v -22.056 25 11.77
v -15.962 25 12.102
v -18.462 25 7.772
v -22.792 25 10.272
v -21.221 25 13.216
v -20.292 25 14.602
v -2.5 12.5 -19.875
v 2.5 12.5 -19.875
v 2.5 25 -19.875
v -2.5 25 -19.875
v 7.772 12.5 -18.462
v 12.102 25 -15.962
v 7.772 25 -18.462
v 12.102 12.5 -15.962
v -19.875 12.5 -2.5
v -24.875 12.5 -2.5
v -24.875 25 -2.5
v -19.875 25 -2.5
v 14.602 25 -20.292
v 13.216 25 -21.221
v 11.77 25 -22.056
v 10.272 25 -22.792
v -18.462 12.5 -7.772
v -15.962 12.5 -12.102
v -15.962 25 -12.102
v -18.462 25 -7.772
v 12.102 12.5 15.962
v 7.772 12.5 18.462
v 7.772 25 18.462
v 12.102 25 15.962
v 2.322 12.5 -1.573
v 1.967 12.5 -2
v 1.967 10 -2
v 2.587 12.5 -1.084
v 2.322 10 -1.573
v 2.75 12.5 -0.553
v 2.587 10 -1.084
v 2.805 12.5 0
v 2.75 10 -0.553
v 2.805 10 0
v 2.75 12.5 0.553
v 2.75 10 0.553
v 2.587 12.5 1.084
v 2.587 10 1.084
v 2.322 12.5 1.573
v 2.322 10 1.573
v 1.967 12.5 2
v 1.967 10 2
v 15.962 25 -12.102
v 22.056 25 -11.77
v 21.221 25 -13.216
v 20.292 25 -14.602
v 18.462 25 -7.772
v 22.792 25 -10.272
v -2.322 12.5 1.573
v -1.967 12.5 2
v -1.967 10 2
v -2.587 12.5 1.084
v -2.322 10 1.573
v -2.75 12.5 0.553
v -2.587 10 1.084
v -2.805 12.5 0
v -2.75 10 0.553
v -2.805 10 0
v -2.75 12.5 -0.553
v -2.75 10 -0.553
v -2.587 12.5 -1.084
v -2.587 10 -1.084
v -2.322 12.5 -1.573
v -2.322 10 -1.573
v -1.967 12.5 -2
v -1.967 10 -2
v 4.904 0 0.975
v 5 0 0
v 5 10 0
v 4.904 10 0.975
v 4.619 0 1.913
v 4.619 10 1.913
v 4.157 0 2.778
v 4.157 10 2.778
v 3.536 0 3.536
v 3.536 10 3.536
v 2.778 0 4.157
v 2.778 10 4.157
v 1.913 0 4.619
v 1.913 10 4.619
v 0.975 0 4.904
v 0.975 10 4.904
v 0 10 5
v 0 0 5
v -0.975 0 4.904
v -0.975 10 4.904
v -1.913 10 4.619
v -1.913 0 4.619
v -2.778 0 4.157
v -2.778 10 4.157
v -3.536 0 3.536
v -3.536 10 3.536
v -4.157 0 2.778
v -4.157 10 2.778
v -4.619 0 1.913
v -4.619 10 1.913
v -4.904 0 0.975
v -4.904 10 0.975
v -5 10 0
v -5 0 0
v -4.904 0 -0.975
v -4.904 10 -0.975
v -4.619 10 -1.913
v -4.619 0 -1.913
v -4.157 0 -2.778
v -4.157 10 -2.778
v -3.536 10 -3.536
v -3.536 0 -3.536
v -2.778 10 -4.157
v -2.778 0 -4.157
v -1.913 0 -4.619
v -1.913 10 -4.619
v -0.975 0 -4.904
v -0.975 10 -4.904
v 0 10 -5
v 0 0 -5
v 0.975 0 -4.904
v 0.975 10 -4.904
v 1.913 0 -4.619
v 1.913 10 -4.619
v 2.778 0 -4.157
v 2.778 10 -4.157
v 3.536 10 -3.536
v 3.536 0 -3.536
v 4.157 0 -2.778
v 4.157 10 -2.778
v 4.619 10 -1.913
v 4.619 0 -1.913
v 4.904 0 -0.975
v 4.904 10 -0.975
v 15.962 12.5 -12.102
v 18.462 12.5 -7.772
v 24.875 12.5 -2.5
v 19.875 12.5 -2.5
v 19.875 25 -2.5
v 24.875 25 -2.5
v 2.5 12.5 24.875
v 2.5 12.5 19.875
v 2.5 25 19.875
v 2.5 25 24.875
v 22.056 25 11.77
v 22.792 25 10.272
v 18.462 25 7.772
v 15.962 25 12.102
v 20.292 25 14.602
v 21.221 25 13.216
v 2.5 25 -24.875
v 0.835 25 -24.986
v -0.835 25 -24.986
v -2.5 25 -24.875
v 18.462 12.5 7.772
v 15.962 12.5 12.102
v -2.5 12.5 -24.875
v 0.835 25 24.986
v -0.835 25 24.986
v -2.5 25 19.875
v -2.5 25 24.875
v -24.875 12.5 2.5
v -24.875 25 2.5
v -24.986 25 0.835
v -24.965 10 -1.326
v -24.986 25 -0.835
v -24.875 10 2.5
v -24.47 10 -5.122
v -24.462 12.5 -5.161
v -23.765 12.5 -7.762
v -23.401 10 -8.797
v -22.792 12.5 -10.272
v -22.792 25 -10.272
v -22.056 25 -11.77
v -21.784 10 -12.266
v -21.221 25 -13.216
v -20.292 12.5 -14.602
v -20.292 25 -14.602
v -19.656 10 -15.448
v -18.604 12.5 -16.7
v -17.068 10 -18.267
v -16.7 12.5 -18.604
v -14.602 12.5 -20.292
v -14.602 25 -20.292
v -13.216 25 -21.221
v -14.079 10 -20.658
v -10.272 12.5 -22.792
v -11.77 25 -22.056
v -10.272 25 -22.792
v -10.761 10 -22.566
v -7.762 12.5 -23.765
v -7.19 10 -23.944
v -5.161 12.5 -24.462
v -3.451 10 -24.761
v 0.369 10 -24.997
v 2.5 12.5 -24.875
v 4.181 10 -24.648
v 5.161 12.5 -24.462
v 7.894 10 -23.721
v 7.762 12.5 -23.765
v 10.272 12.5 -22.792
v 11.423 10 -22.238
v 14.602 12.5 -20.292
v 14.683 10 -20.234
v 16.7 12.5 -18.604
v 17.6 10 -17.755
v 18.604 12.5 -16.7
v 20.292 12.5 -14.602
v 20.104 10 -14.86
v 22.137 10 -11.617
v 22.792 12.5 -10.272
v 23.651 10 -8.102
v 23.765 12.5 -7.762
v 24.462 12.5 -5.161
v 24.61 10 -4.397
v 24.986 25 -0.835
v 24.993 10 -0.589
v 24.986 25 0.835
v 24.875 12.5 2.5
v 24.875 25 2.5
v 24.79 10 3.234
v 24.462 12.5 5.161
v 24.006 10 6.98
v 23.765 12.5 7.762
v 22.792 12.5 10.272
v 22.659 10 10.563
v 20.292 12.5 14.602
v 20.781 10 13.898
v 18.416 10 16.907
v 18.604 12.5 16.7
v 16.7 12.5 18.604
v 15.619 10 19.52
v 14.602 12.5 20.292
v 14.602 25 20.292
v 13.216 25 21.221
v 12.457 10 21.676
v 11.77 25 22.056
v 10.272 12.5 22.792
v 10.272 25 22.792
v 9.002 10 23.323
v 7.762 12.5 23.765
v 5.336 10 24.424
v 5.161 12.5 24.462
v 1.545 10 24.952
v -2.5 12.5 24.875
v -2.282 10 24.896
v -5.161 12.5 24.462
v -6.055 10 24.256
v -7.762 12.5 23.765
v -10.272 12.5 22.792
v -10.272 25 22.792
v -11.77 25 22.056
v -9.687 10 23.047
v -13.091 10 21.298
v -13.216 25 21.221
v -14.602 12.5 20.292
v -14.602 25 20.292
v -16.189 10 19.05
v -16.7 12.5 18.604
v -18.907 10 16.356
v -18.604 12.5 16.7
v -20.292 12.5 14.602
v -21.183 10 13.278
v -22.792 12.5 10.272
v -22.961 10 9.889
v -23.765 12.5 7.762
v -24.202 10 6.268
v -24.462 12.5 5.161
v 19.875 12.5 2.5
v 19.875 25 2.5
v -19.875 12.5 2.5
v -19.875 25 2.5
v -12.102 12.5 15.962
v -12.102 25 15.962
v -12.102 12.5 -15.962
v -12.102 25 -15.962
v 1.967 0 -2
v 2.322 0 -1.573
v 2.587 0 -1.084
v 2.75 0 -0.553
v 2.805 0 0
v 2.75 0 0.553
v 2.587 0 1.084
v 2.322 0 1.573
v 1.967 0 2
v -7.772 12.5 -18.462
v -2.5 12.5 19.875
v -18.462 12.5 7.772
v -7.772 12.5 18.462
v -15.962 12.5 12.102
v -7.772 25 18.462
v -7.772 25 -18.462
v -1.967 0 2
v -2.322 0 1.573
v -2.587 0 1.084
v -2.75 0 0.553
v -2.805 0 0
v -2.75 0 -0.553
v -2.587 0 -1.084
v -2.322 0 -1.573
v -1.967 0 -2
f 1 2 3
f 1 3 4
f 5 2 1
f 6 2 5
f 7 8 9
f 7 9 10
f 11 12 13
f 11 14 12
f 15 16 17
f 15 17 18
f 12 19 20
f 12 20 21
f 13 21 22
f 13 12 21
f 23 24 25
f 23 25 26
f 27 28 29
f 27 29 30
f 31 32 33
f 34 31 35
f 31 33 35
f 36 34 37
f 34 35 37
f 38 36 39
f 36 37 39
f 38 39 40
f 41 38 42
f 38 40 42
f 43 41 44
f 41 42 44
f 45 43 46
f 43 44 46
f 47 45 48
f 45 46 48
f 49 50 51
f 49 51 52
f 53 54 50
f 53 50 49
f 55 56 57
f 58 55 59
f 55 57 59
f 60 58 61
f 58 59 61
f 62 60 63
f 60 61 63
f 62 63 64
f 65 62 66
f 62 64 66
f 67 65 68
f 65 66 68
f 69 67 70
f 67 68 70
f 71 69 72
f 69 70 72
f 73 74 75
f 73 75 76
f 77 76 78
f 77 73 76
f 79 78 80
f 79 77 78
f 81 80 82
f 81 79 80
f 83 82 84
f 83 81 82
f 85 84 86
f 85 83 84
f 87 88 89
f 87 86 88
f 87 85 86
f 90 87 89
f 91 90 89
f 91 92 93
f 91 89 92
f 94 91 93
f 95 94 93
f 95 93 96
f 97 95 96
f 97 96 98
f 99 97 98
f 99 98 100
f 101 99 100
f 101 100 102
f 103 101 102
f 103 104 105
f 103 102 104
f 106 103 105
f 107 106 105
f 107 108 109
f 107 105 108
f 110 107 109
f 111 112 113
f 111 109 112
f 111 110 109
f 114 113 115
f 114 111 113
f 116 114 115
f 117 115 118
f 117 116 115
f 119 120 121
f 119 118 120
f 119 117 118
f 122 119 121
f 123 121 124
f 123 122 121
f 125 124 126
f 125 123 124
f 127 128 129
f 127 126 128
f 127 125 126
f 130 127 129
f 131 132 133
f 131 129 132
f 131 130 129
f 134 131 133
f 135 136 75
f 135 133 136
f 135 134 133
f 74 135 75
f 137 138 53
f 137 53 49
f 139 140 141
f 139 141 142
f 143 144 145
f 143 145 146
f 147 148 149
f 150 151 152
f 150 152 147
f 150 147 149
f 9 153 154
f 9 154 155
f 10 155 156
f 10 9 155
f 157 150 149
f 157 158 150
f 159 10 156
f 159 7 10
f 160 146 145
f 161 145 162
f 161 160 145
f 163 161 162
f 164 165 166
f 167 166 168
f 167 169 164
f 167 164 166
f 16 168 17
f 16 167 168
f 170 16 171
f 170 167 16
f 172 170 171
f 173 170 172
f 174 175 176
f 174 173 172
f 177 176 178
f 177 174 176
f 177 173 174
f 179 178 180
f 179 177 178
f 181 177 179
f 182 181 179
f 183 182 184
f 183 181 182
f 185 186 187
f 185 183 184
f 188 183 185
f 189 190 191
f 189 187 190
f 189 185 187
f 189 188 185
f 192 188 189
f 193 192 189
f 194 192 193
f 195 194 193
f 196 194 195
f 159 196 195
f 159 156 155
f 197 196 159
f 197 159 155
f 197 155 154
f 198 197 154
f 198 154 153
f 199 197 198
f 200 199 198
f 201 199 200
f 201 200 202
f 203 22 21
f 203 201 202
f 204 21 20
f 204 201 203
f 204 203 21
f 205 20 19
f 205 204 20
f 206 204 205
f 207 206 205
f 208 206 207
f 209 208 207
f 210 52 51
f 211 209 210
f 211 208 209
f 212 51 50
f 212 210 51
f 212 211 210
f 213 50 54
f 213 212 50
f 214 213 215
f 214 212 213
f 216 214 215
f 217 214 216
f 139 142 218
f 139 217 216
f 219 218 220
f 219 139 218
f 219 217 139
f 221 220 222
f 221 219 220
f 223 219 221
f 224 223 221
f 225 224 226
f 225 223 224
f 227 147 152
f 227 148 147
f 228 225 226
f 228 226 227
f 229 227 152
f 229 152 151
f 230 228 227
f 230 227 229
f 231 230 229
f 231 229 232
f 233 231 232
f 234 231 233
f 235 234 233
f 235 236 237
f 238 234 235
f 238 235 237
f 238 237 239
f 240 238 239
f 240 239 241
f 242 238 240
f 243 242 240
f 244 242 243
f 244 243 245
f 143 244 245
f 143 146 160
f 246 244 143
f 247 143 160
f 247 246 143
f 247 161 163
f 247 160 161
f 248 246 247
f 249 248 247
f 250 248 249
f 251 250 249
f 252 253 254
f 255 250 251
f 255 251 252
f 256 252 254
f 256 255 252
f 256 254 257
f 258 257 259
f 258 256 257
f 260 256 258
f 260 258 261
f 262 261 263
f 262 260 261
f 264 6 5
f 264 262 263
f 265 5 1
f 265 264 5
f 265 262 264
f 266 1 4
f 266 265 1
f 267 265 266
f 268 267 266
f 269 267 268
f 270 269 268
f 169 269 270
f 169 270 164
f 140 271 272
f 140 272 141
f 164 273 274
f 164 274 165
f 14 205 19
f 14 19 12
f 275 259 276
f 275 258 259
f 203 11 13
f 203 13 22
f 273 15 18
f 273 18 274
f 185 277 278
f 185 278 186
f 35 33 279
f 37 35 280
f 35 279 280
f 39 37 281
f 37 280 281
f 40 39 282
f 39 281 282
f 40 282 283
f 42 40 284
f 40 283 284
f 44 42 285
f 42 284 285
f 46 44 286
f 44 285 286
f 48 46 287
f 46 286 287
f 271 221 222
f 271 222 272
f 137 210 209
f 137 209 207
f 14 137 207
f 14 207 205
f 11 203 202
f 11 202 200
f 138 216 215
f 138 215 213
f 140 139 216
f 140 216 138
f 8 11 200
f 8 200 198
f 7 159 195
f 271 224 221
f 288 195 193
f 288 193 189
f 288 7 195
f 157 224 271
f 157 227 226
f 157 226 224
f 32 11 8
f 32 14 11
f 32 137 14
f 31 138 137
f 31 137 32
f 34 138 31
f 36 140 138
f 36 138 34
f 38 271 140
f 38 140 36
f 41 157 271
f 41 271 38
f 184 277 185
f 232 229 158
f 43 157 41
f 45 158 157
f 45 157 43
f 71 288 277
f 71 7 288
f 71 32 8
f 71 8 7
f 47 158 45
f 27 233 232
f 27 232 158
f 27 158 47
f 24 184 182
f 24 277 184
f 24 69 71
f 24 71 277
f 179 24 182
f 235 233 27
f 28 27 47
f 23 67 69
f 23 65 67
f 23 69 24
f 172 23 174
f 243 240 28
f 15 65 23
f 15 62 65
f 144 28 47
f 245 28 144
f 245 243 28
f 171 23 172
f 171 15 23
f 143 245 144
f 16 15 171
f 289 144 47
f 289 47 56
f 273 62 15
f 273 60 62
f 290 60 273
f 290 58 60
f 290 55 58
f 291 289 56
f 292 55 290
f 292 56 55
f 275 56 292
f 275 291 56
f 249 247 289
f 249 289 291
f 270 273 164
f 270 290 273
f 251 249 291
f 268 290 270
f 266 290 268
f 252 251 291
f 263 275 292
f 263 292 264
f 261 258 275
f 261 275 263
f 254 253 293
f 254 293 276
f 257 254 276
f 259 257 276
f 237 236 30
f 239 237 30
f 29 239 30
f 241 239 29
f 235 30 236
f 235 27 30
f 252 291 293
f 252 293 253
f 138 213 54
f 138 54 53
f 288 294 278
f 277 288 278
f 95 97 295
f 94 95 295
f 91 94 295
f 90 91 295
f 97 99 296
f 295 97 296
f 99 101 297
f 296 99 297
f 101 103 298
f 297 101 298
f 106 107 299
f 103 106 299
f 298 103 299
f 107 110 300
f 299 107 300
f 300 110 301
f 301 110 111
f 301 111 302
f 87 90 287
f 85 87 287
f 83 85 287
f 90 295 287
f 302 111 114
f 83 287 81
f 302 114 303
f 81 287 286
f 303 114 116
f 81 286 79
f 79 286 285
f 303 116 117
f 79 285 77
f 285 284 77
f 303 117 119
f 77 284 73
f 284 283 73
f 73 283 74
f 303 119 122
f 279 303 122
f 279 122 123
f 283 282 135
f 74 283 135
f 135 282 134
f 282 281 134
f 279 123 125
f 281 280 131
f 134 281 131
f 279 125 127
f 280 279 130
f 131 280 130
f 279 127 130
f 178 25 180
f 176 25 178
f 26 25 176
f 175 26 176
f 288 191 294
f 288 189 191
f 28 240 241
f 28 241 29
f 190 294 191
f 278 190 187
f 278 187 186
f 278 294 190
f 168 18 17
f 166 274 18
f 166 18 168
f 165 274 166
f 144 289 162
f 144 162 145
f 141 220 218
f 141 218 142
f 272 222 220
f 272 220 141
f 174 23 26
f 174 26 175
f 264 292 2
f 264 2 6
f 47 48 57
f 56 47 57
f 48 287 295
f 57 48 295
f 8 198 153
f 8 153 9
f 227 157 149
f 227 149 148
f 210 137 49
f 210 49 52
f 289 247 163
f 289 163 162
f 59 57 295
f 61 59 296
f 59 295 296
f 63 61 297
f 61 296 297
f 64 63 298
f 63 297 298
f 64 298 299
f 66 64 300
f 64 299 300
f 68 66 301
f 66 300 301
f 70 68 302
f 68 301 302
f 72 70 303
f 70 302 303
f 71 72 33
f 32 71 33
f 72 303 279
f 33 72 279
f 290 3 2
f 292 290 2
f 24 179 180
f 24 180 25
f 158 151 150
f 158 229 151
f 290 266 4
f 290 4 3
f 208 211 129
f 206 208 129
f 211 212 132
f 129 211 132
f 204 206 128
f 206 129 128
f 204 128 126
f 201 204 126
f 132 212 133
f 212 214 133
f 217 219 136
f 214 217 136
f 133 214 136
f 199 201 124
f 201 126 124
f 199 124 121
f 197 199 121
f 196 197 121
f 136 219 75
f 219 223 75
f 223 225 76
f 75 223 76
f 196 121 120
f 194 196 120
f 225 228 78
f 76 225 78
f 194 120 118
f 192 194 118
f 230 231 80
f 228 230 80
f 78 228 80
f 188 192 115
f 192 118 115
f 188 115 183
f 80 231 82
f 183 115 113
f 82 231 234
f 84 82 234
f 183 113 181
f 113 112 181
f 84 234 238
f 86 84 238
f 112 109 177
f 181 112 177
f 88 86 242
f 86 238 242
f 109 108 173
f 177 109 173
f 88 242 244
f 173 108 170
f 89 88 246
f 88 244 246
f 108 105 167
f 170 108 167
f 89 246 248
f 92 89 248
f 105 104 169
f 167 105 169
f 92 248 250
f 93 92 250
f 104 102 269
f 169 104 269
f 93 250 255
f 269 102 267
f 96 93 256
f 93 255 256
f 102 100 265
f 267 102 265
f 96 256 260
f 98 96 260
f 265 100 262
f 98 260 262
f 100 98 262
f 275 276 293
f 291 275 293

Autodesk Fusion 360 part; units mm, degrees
sketch "Sketch1" plane through (0, 0, 0) normal (0, 1, 0) x (1, 0, 0)
  circle A0 centre (0, 0) radius 2.805
  line L0 (-2.805, 2) -> (2.805, 2)
  line L1 (2.805, 2) -> (2.805, -2)
  line L2 (2.805, -2) -> (-2.805, -2)
  line L3 (-2.805, -2) -> (-2.805, 2)
  line L4 (0, 2) -> (0, 0) construction
  line L5 (0, 0) -> (0, -2) construction
  circle A1 centre (0, 0) radius 5
  dimension "d1" = 5.61
  dimension "d2" = 2
  dimension "d3" = 10
extrude "Extrude1" add sketch "Sketch1" along normal blind 10 contours A0 L1 L2 | A0 L0 L1 | A0 L0 | A0 L2 | A0 L0 L3 | A0 L2 L3 | A1
sketch "Sketch2" plane through (0, 10, 0) normal (0, 1, 0) x (-1, 0, 0)
  arc A0 (1.9667, -2) -> (1.9667, 2) centre (0, 0) ccw
  line L0 (1.9667, -2) -> (-1.9667, -2)
  arc A1 (-1.9667, 2) -> (-1.9667, -2) centre (0, 0) ccw
  line L1 (-1.9667, 2) -> (1.9667, 2)
  circle A2 centre (0, 0) radius 5
  circle A3 centre (0, 0) radius 25
  line L2 (-2.5, -24.8747) -> (-2.5, -19.8747)
  line L3 (-2.5, -19.8747) -> (2.5, -19.8747)
  line L4 (2.5, -19.8747) -> (2.5, -24.8747)
  line L5 (12.1024, -15.962) -> (14.6024, -20.2921)
  line L6 (7.7723, -18.462) -> (12.1024, -15.962)
  line L7 (10.2723, -22.7921) -> (7.7723, -18.462)
  line L8 (18.462, -7.7723) -> (22.7921, -10.2723)
  line L9 (15.962, -12.1024) -> (18.462, -7.7723)
  line L10 (20.2921, -14.6024) -> (15.962, -12.1024)
  line L11 (19.8747, 2.5) -> (24.8747, 2.5)
  line L12 (19.8747, -2.5) -> (19.8747, 2.5)
  line L13 (24.8747, -2.5) -> (19.8747, -2.5)
  line L14 (15.962, 12.1024) -> (20.2921, 14.6024)
  line L15 (18.462, 7.7723) -> (15.962, 12.1024)
  line L16 (22.7921, 10.2723) -> (18.462, 7.7723)
  line L17 (7.7723, 18.462) -> (10.2723, 22.7921)
  line L18 (12.1024, 15.962) -> (7.7723, 18.462)
  line L19 (14.6024, 20.2921) -> (12.1024, 15.962)
  line L20 (-2.5, 19.8747) -> (-2.5, 24.8747)
  line L21 (2.5, 19.8747) -> (-2.5, 19.8747)
  line L22 (2.5, 24.8747) -> (2.5, 19.8747)
  line L23 (-12.1024, 15.962) -> (-14.6024, 20.2921)
  line L24 (-7.7723, 18.462) -> (-12.1024, 15.962)
  line L25 (-10.2723, 22.7921) -> (-7.7723, 18.462)
  line L26 (-18.462, 7.7723) -> (-22.7921, 10.2723)
  line L27 (-15.962, 12.1024) -> (-18.462, 7.7723)
  line L28 (-20.2921, 14.6024) -> (-15.962, 12.1024)
  line L29 (-19.8747, -2.5) -> (-24.8747, -2.5)
  line L30 (-19.8747, 2.5) -> (-19.8747, -2.5)
  line L31 (-24.8747, 2.5) -> (-19.8747, 2.5)
  line L32 (-15.962, -12.1024) -> (-20.2921, -14.6024)
  line L33 (-18.462, -7.7723) -> (-15.962, -12.1024)
  line L34 (-22.7921, -10.2723) -> (-18.462, -7.7723)
  line L35 (-7.7723, -18.462) -> (-10.2723, -22.7921)
  line L36 (-12.1024, -15.962) -> (-7.7723, -18.462)
  line L37 (-14.6024, -20.2921) -> (-12.1024, -15.962)
  dimension "d6" = 50
  dimension "d7" = 5
  dimension "d9" = 360
extrude "Extrude2" add sketch "Sketch2" along normal blind 2.5 contours A2 | A3 L2 L3 L4 L5 L6 L7 L8 L9 L10 L11 L12 L13 L14 L15 L16 L17 L18 L19 L20 L21 L22 L23 L24 L25 L26 L27 L28 L29 L30 L31 L32 L33 L34 L35 L36 L37
extrude "Extrude3" add sketch "Sketch2" along normal blind 15 contours A3 L11 L12 L13 | A3 L14 L15 L16 | A3 L8 L9 L10 | A3 L17 L18 L19 | A3 L5 L6 L7 | A3 L20 L21 L22 | A3 L2 L3 L4 | A3 L23 L24 L25 | A3 L35 L36 L37 | A3 L26 L27 L28 | A3 L32 L33 L34 | A3 L29 L30 L31
equation "d1 = ( 5.5 * 1.02 ) * 1 mm"
